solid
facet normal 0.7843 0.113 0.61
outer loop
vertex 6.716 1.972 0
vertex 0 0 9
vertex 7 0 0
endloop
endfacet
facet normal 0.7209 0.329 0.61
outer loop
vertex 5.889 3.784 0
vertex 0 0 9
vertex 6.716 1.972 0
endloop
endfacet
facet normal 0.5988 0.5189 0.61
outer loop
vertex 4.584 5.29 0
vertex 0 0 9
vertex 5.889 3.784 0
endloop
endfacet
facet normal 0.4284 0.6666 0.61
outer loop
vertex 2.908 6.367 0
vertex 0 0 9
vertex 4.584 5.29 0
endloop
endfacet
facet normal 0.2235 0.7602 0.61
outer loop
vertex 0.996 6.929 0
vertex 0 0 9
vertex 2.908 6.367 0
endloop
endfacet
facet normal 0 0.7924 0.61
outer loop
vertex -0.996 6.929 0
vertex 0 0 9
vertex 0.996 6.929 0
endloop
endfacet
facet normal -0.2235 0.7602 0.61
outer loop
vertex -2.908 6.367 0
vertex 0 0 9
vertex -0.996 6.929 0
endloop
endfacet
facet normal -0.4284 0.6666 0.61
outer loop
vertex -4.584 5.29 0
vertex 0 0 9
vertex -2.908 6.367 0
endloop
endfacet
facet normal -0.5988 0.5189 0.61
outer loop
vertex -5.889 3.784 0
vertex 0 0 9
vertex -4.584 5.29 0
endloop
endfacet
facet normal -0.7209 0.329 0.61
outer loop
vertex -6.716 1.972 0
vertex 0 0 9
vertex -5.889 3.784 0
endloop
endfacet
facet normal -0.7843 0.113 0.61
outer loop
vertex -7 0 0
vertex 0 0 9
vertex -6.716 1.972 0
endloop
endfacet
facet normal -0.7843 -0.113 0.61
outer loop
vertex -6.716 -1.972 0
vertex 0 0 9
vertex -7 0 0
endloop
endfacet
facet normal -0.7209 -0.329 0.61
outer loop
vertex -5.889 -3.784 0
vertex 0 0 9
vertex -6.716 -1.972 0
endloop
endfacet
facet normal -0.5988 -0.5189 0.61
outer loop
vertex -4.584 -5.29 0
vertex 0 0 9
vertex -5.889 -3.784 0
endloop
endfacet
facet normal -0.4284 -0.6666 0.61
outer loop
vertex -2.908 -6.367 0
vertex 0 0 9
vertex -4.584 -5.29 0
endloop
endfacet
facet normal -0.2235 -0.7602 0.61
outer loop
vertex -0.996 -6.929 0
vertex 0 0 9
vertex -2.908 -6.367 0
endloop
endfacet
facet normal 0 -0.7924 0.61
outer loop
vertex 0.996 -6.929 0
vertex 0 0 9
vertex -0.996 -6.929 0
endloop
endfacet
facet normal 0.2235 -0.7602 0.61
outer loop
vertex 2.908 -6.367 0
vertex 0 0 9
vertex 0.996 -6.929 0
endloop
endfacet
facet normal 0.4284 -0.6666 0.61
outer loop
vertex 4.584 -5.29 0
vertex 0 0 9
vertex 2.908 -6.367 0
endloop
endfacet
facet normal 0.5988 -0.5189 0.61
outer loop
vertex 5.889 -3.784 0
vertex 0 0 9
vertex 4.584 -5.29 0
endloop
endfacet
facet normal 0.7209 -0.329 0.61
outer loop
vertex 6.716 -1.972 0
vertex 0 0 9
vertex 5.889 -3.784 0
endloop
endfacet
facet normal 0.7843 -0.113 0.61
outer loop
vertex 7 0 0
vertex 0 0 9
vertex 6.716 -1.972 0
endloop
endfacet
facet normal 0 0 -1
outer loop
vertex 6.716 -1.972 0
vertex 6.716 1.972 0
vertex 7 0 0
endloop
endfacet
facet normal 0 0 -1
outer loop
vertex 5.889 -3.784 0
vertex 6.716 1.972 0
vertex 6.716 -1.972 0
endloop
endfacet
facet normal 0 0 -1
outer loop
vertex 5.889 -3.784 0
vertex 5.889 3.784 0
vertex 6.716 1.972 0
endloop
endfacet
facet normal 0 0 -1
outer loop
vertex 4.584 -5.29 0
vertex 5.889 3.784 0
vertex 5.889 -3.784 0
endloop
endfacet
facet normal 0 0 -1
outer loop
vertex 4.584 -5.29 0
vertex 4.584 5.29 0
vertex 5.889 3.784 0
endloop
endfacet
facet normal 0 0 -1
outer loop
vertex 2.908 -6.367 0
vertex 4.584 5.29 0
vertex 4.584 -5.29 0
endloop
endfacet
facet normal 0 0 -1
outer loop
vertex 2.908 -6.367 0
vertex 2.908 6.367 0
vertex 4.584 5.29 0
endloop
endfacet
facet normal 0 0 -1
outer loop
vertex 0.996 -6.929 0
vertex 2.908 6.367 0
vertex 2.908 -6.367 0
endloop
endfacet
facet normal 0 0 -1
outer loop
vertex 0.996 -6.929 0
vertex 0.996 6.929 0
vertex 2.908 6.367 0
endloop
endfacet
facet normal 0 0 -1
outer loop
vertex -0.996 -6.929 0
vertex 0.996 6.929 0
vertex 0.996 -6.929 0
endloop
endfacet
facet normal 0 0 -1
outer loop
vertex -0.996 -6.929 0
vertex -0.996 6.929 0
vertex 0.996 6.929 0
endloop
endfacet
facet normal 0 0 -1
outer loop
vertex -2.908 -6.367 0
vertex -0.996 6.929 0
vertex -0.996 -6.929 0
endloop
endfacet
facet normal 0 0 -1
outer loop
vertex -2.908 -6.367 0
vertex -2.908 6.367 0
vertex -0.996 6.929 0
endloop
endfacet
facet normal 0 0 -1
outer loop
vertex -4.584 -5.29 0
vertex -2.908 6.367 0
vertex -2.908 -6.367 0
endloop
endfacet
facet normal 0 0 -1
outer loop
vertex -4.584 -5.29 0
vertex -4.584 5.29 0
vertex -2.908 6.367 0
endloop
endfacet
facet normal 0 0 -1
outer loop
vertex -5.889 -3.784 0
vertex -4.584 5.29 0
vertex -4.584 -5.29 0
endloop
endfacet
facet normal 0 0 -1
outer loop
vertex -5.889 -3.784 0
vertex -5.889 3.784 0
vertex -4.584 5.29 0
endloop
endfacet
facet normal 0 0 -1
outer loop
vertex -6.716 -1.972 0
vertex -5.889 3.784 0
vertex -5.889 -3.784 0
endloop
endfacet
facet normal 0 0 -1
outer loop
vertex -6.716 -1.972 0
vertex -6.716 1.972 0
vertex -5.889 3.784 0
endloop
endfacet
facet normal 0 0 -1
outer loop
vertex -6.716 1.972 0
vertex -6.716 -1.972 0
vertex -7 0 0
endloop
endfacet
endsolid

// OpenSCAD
// Generated by SolidPython 1.0.1 on 2020-07-29 00:46:43


cylinder(h = 9, r1 = 7, r2 = 0);
/***********************************************
*********      SolidPython code:      **********
************************************************
 
# import packages: SolidPython
from solid import *
from solid.utils import *
from itertools import chain, combinations, permutations


class Resize:

    def __init__(self, scad_file):
        self.scad_file = scad_file
        #self.scad_file = import_scad(scad_file)
        # cone/cylinder param:
        self.r1 = 0
        self.r2 = 0
        self.h = 0
        # rectangular prism param:
        self.w = 0
        self.l = 0
        # ellipse param:
        self.r = 0

    # import OpenScad code (file name corresponds to shape)


    # classify shape + parameters
    def assign(self, param1, param2, param3):
        if self.scad_file == 'cone.scad':
            self.r1 = param1
            self.r2 = param2
            self.h = param3
        elif self.scad_file == 'cylinder.scad':
            self.r1 = param1
            self.r2 = param2
            self.h = param3
        elif self.scad_file == 'rectangularPrism.scad':
            self.h = param1
            self.l = param2
            self.w = param3
        else:
            self.r = param1
            self.h = param2

    # resize parameters
    def iterate(self):
        x = range(3, 20, 2)
        i = 1
        if self.scad_file == 'cone.scad':
            tempList = list(permutations(x, 2))
            for temp in tempList:
                param1 = temp[0]
                param2 = temp[1]
                filepath = 'produced_scad_files/' + 'cone' + str(param1) + '_' + str(param2) + '_' + '.scad'
                scad_render_to_file(cylinder(h=param1, r1=param2, r2=0), filepath)

        elif self.scad_file == 'cylinder.scad':
            tempList = list(permutations(x, 3))
            for temp in tempList:
                param1 = temp[0]
                param2 = temp[1]
                filepath = 'produced_scad_files/' + 'cylinder' + str(param1) + '_' + str(param2) + '_' + '.scad'
                scad_render_to_file(cylinder(h=param1, r1=param2, r2=param2), filepath)

        elif self.scad_file == 'rectangularPrism.scad':
            tempList = list(permutations(x, 3))
            for temp in tempList:
                param1 = temp[0]
                param2 = temp[1]
                param3 = temp[2]
                filepath = 'produced_scad_files/' + 'rectangularPrism' + str(param1) + '_' + str(param2) + '_' + str(
                    param3) + '.scad'
                scad_render_to_file(cube(size=(param1, param2, param3)), filepath)

        elif self.scad_file == 'ellipse.scad':
            tempList = list(permutations(x, 4))
            for temp in tempList:
                param1 = temp[0]
                param2 = temp[1]
                param3 = temp[2]
                param4 = temp[3]
                filepath = 'produced_scad_files/' + 'ellipse' + str(param1) + '_' + str(param2) + '_' + str(param3) + '_' + str(param4) + '.scad'
                scad_render_to_file(scale([param1, param2, param3])(sphere(r=param4)), filepath)

    def render_to_scadfile(self):
        scad_render_to_file(scad, 'example.scad') 
 
************************************************/
